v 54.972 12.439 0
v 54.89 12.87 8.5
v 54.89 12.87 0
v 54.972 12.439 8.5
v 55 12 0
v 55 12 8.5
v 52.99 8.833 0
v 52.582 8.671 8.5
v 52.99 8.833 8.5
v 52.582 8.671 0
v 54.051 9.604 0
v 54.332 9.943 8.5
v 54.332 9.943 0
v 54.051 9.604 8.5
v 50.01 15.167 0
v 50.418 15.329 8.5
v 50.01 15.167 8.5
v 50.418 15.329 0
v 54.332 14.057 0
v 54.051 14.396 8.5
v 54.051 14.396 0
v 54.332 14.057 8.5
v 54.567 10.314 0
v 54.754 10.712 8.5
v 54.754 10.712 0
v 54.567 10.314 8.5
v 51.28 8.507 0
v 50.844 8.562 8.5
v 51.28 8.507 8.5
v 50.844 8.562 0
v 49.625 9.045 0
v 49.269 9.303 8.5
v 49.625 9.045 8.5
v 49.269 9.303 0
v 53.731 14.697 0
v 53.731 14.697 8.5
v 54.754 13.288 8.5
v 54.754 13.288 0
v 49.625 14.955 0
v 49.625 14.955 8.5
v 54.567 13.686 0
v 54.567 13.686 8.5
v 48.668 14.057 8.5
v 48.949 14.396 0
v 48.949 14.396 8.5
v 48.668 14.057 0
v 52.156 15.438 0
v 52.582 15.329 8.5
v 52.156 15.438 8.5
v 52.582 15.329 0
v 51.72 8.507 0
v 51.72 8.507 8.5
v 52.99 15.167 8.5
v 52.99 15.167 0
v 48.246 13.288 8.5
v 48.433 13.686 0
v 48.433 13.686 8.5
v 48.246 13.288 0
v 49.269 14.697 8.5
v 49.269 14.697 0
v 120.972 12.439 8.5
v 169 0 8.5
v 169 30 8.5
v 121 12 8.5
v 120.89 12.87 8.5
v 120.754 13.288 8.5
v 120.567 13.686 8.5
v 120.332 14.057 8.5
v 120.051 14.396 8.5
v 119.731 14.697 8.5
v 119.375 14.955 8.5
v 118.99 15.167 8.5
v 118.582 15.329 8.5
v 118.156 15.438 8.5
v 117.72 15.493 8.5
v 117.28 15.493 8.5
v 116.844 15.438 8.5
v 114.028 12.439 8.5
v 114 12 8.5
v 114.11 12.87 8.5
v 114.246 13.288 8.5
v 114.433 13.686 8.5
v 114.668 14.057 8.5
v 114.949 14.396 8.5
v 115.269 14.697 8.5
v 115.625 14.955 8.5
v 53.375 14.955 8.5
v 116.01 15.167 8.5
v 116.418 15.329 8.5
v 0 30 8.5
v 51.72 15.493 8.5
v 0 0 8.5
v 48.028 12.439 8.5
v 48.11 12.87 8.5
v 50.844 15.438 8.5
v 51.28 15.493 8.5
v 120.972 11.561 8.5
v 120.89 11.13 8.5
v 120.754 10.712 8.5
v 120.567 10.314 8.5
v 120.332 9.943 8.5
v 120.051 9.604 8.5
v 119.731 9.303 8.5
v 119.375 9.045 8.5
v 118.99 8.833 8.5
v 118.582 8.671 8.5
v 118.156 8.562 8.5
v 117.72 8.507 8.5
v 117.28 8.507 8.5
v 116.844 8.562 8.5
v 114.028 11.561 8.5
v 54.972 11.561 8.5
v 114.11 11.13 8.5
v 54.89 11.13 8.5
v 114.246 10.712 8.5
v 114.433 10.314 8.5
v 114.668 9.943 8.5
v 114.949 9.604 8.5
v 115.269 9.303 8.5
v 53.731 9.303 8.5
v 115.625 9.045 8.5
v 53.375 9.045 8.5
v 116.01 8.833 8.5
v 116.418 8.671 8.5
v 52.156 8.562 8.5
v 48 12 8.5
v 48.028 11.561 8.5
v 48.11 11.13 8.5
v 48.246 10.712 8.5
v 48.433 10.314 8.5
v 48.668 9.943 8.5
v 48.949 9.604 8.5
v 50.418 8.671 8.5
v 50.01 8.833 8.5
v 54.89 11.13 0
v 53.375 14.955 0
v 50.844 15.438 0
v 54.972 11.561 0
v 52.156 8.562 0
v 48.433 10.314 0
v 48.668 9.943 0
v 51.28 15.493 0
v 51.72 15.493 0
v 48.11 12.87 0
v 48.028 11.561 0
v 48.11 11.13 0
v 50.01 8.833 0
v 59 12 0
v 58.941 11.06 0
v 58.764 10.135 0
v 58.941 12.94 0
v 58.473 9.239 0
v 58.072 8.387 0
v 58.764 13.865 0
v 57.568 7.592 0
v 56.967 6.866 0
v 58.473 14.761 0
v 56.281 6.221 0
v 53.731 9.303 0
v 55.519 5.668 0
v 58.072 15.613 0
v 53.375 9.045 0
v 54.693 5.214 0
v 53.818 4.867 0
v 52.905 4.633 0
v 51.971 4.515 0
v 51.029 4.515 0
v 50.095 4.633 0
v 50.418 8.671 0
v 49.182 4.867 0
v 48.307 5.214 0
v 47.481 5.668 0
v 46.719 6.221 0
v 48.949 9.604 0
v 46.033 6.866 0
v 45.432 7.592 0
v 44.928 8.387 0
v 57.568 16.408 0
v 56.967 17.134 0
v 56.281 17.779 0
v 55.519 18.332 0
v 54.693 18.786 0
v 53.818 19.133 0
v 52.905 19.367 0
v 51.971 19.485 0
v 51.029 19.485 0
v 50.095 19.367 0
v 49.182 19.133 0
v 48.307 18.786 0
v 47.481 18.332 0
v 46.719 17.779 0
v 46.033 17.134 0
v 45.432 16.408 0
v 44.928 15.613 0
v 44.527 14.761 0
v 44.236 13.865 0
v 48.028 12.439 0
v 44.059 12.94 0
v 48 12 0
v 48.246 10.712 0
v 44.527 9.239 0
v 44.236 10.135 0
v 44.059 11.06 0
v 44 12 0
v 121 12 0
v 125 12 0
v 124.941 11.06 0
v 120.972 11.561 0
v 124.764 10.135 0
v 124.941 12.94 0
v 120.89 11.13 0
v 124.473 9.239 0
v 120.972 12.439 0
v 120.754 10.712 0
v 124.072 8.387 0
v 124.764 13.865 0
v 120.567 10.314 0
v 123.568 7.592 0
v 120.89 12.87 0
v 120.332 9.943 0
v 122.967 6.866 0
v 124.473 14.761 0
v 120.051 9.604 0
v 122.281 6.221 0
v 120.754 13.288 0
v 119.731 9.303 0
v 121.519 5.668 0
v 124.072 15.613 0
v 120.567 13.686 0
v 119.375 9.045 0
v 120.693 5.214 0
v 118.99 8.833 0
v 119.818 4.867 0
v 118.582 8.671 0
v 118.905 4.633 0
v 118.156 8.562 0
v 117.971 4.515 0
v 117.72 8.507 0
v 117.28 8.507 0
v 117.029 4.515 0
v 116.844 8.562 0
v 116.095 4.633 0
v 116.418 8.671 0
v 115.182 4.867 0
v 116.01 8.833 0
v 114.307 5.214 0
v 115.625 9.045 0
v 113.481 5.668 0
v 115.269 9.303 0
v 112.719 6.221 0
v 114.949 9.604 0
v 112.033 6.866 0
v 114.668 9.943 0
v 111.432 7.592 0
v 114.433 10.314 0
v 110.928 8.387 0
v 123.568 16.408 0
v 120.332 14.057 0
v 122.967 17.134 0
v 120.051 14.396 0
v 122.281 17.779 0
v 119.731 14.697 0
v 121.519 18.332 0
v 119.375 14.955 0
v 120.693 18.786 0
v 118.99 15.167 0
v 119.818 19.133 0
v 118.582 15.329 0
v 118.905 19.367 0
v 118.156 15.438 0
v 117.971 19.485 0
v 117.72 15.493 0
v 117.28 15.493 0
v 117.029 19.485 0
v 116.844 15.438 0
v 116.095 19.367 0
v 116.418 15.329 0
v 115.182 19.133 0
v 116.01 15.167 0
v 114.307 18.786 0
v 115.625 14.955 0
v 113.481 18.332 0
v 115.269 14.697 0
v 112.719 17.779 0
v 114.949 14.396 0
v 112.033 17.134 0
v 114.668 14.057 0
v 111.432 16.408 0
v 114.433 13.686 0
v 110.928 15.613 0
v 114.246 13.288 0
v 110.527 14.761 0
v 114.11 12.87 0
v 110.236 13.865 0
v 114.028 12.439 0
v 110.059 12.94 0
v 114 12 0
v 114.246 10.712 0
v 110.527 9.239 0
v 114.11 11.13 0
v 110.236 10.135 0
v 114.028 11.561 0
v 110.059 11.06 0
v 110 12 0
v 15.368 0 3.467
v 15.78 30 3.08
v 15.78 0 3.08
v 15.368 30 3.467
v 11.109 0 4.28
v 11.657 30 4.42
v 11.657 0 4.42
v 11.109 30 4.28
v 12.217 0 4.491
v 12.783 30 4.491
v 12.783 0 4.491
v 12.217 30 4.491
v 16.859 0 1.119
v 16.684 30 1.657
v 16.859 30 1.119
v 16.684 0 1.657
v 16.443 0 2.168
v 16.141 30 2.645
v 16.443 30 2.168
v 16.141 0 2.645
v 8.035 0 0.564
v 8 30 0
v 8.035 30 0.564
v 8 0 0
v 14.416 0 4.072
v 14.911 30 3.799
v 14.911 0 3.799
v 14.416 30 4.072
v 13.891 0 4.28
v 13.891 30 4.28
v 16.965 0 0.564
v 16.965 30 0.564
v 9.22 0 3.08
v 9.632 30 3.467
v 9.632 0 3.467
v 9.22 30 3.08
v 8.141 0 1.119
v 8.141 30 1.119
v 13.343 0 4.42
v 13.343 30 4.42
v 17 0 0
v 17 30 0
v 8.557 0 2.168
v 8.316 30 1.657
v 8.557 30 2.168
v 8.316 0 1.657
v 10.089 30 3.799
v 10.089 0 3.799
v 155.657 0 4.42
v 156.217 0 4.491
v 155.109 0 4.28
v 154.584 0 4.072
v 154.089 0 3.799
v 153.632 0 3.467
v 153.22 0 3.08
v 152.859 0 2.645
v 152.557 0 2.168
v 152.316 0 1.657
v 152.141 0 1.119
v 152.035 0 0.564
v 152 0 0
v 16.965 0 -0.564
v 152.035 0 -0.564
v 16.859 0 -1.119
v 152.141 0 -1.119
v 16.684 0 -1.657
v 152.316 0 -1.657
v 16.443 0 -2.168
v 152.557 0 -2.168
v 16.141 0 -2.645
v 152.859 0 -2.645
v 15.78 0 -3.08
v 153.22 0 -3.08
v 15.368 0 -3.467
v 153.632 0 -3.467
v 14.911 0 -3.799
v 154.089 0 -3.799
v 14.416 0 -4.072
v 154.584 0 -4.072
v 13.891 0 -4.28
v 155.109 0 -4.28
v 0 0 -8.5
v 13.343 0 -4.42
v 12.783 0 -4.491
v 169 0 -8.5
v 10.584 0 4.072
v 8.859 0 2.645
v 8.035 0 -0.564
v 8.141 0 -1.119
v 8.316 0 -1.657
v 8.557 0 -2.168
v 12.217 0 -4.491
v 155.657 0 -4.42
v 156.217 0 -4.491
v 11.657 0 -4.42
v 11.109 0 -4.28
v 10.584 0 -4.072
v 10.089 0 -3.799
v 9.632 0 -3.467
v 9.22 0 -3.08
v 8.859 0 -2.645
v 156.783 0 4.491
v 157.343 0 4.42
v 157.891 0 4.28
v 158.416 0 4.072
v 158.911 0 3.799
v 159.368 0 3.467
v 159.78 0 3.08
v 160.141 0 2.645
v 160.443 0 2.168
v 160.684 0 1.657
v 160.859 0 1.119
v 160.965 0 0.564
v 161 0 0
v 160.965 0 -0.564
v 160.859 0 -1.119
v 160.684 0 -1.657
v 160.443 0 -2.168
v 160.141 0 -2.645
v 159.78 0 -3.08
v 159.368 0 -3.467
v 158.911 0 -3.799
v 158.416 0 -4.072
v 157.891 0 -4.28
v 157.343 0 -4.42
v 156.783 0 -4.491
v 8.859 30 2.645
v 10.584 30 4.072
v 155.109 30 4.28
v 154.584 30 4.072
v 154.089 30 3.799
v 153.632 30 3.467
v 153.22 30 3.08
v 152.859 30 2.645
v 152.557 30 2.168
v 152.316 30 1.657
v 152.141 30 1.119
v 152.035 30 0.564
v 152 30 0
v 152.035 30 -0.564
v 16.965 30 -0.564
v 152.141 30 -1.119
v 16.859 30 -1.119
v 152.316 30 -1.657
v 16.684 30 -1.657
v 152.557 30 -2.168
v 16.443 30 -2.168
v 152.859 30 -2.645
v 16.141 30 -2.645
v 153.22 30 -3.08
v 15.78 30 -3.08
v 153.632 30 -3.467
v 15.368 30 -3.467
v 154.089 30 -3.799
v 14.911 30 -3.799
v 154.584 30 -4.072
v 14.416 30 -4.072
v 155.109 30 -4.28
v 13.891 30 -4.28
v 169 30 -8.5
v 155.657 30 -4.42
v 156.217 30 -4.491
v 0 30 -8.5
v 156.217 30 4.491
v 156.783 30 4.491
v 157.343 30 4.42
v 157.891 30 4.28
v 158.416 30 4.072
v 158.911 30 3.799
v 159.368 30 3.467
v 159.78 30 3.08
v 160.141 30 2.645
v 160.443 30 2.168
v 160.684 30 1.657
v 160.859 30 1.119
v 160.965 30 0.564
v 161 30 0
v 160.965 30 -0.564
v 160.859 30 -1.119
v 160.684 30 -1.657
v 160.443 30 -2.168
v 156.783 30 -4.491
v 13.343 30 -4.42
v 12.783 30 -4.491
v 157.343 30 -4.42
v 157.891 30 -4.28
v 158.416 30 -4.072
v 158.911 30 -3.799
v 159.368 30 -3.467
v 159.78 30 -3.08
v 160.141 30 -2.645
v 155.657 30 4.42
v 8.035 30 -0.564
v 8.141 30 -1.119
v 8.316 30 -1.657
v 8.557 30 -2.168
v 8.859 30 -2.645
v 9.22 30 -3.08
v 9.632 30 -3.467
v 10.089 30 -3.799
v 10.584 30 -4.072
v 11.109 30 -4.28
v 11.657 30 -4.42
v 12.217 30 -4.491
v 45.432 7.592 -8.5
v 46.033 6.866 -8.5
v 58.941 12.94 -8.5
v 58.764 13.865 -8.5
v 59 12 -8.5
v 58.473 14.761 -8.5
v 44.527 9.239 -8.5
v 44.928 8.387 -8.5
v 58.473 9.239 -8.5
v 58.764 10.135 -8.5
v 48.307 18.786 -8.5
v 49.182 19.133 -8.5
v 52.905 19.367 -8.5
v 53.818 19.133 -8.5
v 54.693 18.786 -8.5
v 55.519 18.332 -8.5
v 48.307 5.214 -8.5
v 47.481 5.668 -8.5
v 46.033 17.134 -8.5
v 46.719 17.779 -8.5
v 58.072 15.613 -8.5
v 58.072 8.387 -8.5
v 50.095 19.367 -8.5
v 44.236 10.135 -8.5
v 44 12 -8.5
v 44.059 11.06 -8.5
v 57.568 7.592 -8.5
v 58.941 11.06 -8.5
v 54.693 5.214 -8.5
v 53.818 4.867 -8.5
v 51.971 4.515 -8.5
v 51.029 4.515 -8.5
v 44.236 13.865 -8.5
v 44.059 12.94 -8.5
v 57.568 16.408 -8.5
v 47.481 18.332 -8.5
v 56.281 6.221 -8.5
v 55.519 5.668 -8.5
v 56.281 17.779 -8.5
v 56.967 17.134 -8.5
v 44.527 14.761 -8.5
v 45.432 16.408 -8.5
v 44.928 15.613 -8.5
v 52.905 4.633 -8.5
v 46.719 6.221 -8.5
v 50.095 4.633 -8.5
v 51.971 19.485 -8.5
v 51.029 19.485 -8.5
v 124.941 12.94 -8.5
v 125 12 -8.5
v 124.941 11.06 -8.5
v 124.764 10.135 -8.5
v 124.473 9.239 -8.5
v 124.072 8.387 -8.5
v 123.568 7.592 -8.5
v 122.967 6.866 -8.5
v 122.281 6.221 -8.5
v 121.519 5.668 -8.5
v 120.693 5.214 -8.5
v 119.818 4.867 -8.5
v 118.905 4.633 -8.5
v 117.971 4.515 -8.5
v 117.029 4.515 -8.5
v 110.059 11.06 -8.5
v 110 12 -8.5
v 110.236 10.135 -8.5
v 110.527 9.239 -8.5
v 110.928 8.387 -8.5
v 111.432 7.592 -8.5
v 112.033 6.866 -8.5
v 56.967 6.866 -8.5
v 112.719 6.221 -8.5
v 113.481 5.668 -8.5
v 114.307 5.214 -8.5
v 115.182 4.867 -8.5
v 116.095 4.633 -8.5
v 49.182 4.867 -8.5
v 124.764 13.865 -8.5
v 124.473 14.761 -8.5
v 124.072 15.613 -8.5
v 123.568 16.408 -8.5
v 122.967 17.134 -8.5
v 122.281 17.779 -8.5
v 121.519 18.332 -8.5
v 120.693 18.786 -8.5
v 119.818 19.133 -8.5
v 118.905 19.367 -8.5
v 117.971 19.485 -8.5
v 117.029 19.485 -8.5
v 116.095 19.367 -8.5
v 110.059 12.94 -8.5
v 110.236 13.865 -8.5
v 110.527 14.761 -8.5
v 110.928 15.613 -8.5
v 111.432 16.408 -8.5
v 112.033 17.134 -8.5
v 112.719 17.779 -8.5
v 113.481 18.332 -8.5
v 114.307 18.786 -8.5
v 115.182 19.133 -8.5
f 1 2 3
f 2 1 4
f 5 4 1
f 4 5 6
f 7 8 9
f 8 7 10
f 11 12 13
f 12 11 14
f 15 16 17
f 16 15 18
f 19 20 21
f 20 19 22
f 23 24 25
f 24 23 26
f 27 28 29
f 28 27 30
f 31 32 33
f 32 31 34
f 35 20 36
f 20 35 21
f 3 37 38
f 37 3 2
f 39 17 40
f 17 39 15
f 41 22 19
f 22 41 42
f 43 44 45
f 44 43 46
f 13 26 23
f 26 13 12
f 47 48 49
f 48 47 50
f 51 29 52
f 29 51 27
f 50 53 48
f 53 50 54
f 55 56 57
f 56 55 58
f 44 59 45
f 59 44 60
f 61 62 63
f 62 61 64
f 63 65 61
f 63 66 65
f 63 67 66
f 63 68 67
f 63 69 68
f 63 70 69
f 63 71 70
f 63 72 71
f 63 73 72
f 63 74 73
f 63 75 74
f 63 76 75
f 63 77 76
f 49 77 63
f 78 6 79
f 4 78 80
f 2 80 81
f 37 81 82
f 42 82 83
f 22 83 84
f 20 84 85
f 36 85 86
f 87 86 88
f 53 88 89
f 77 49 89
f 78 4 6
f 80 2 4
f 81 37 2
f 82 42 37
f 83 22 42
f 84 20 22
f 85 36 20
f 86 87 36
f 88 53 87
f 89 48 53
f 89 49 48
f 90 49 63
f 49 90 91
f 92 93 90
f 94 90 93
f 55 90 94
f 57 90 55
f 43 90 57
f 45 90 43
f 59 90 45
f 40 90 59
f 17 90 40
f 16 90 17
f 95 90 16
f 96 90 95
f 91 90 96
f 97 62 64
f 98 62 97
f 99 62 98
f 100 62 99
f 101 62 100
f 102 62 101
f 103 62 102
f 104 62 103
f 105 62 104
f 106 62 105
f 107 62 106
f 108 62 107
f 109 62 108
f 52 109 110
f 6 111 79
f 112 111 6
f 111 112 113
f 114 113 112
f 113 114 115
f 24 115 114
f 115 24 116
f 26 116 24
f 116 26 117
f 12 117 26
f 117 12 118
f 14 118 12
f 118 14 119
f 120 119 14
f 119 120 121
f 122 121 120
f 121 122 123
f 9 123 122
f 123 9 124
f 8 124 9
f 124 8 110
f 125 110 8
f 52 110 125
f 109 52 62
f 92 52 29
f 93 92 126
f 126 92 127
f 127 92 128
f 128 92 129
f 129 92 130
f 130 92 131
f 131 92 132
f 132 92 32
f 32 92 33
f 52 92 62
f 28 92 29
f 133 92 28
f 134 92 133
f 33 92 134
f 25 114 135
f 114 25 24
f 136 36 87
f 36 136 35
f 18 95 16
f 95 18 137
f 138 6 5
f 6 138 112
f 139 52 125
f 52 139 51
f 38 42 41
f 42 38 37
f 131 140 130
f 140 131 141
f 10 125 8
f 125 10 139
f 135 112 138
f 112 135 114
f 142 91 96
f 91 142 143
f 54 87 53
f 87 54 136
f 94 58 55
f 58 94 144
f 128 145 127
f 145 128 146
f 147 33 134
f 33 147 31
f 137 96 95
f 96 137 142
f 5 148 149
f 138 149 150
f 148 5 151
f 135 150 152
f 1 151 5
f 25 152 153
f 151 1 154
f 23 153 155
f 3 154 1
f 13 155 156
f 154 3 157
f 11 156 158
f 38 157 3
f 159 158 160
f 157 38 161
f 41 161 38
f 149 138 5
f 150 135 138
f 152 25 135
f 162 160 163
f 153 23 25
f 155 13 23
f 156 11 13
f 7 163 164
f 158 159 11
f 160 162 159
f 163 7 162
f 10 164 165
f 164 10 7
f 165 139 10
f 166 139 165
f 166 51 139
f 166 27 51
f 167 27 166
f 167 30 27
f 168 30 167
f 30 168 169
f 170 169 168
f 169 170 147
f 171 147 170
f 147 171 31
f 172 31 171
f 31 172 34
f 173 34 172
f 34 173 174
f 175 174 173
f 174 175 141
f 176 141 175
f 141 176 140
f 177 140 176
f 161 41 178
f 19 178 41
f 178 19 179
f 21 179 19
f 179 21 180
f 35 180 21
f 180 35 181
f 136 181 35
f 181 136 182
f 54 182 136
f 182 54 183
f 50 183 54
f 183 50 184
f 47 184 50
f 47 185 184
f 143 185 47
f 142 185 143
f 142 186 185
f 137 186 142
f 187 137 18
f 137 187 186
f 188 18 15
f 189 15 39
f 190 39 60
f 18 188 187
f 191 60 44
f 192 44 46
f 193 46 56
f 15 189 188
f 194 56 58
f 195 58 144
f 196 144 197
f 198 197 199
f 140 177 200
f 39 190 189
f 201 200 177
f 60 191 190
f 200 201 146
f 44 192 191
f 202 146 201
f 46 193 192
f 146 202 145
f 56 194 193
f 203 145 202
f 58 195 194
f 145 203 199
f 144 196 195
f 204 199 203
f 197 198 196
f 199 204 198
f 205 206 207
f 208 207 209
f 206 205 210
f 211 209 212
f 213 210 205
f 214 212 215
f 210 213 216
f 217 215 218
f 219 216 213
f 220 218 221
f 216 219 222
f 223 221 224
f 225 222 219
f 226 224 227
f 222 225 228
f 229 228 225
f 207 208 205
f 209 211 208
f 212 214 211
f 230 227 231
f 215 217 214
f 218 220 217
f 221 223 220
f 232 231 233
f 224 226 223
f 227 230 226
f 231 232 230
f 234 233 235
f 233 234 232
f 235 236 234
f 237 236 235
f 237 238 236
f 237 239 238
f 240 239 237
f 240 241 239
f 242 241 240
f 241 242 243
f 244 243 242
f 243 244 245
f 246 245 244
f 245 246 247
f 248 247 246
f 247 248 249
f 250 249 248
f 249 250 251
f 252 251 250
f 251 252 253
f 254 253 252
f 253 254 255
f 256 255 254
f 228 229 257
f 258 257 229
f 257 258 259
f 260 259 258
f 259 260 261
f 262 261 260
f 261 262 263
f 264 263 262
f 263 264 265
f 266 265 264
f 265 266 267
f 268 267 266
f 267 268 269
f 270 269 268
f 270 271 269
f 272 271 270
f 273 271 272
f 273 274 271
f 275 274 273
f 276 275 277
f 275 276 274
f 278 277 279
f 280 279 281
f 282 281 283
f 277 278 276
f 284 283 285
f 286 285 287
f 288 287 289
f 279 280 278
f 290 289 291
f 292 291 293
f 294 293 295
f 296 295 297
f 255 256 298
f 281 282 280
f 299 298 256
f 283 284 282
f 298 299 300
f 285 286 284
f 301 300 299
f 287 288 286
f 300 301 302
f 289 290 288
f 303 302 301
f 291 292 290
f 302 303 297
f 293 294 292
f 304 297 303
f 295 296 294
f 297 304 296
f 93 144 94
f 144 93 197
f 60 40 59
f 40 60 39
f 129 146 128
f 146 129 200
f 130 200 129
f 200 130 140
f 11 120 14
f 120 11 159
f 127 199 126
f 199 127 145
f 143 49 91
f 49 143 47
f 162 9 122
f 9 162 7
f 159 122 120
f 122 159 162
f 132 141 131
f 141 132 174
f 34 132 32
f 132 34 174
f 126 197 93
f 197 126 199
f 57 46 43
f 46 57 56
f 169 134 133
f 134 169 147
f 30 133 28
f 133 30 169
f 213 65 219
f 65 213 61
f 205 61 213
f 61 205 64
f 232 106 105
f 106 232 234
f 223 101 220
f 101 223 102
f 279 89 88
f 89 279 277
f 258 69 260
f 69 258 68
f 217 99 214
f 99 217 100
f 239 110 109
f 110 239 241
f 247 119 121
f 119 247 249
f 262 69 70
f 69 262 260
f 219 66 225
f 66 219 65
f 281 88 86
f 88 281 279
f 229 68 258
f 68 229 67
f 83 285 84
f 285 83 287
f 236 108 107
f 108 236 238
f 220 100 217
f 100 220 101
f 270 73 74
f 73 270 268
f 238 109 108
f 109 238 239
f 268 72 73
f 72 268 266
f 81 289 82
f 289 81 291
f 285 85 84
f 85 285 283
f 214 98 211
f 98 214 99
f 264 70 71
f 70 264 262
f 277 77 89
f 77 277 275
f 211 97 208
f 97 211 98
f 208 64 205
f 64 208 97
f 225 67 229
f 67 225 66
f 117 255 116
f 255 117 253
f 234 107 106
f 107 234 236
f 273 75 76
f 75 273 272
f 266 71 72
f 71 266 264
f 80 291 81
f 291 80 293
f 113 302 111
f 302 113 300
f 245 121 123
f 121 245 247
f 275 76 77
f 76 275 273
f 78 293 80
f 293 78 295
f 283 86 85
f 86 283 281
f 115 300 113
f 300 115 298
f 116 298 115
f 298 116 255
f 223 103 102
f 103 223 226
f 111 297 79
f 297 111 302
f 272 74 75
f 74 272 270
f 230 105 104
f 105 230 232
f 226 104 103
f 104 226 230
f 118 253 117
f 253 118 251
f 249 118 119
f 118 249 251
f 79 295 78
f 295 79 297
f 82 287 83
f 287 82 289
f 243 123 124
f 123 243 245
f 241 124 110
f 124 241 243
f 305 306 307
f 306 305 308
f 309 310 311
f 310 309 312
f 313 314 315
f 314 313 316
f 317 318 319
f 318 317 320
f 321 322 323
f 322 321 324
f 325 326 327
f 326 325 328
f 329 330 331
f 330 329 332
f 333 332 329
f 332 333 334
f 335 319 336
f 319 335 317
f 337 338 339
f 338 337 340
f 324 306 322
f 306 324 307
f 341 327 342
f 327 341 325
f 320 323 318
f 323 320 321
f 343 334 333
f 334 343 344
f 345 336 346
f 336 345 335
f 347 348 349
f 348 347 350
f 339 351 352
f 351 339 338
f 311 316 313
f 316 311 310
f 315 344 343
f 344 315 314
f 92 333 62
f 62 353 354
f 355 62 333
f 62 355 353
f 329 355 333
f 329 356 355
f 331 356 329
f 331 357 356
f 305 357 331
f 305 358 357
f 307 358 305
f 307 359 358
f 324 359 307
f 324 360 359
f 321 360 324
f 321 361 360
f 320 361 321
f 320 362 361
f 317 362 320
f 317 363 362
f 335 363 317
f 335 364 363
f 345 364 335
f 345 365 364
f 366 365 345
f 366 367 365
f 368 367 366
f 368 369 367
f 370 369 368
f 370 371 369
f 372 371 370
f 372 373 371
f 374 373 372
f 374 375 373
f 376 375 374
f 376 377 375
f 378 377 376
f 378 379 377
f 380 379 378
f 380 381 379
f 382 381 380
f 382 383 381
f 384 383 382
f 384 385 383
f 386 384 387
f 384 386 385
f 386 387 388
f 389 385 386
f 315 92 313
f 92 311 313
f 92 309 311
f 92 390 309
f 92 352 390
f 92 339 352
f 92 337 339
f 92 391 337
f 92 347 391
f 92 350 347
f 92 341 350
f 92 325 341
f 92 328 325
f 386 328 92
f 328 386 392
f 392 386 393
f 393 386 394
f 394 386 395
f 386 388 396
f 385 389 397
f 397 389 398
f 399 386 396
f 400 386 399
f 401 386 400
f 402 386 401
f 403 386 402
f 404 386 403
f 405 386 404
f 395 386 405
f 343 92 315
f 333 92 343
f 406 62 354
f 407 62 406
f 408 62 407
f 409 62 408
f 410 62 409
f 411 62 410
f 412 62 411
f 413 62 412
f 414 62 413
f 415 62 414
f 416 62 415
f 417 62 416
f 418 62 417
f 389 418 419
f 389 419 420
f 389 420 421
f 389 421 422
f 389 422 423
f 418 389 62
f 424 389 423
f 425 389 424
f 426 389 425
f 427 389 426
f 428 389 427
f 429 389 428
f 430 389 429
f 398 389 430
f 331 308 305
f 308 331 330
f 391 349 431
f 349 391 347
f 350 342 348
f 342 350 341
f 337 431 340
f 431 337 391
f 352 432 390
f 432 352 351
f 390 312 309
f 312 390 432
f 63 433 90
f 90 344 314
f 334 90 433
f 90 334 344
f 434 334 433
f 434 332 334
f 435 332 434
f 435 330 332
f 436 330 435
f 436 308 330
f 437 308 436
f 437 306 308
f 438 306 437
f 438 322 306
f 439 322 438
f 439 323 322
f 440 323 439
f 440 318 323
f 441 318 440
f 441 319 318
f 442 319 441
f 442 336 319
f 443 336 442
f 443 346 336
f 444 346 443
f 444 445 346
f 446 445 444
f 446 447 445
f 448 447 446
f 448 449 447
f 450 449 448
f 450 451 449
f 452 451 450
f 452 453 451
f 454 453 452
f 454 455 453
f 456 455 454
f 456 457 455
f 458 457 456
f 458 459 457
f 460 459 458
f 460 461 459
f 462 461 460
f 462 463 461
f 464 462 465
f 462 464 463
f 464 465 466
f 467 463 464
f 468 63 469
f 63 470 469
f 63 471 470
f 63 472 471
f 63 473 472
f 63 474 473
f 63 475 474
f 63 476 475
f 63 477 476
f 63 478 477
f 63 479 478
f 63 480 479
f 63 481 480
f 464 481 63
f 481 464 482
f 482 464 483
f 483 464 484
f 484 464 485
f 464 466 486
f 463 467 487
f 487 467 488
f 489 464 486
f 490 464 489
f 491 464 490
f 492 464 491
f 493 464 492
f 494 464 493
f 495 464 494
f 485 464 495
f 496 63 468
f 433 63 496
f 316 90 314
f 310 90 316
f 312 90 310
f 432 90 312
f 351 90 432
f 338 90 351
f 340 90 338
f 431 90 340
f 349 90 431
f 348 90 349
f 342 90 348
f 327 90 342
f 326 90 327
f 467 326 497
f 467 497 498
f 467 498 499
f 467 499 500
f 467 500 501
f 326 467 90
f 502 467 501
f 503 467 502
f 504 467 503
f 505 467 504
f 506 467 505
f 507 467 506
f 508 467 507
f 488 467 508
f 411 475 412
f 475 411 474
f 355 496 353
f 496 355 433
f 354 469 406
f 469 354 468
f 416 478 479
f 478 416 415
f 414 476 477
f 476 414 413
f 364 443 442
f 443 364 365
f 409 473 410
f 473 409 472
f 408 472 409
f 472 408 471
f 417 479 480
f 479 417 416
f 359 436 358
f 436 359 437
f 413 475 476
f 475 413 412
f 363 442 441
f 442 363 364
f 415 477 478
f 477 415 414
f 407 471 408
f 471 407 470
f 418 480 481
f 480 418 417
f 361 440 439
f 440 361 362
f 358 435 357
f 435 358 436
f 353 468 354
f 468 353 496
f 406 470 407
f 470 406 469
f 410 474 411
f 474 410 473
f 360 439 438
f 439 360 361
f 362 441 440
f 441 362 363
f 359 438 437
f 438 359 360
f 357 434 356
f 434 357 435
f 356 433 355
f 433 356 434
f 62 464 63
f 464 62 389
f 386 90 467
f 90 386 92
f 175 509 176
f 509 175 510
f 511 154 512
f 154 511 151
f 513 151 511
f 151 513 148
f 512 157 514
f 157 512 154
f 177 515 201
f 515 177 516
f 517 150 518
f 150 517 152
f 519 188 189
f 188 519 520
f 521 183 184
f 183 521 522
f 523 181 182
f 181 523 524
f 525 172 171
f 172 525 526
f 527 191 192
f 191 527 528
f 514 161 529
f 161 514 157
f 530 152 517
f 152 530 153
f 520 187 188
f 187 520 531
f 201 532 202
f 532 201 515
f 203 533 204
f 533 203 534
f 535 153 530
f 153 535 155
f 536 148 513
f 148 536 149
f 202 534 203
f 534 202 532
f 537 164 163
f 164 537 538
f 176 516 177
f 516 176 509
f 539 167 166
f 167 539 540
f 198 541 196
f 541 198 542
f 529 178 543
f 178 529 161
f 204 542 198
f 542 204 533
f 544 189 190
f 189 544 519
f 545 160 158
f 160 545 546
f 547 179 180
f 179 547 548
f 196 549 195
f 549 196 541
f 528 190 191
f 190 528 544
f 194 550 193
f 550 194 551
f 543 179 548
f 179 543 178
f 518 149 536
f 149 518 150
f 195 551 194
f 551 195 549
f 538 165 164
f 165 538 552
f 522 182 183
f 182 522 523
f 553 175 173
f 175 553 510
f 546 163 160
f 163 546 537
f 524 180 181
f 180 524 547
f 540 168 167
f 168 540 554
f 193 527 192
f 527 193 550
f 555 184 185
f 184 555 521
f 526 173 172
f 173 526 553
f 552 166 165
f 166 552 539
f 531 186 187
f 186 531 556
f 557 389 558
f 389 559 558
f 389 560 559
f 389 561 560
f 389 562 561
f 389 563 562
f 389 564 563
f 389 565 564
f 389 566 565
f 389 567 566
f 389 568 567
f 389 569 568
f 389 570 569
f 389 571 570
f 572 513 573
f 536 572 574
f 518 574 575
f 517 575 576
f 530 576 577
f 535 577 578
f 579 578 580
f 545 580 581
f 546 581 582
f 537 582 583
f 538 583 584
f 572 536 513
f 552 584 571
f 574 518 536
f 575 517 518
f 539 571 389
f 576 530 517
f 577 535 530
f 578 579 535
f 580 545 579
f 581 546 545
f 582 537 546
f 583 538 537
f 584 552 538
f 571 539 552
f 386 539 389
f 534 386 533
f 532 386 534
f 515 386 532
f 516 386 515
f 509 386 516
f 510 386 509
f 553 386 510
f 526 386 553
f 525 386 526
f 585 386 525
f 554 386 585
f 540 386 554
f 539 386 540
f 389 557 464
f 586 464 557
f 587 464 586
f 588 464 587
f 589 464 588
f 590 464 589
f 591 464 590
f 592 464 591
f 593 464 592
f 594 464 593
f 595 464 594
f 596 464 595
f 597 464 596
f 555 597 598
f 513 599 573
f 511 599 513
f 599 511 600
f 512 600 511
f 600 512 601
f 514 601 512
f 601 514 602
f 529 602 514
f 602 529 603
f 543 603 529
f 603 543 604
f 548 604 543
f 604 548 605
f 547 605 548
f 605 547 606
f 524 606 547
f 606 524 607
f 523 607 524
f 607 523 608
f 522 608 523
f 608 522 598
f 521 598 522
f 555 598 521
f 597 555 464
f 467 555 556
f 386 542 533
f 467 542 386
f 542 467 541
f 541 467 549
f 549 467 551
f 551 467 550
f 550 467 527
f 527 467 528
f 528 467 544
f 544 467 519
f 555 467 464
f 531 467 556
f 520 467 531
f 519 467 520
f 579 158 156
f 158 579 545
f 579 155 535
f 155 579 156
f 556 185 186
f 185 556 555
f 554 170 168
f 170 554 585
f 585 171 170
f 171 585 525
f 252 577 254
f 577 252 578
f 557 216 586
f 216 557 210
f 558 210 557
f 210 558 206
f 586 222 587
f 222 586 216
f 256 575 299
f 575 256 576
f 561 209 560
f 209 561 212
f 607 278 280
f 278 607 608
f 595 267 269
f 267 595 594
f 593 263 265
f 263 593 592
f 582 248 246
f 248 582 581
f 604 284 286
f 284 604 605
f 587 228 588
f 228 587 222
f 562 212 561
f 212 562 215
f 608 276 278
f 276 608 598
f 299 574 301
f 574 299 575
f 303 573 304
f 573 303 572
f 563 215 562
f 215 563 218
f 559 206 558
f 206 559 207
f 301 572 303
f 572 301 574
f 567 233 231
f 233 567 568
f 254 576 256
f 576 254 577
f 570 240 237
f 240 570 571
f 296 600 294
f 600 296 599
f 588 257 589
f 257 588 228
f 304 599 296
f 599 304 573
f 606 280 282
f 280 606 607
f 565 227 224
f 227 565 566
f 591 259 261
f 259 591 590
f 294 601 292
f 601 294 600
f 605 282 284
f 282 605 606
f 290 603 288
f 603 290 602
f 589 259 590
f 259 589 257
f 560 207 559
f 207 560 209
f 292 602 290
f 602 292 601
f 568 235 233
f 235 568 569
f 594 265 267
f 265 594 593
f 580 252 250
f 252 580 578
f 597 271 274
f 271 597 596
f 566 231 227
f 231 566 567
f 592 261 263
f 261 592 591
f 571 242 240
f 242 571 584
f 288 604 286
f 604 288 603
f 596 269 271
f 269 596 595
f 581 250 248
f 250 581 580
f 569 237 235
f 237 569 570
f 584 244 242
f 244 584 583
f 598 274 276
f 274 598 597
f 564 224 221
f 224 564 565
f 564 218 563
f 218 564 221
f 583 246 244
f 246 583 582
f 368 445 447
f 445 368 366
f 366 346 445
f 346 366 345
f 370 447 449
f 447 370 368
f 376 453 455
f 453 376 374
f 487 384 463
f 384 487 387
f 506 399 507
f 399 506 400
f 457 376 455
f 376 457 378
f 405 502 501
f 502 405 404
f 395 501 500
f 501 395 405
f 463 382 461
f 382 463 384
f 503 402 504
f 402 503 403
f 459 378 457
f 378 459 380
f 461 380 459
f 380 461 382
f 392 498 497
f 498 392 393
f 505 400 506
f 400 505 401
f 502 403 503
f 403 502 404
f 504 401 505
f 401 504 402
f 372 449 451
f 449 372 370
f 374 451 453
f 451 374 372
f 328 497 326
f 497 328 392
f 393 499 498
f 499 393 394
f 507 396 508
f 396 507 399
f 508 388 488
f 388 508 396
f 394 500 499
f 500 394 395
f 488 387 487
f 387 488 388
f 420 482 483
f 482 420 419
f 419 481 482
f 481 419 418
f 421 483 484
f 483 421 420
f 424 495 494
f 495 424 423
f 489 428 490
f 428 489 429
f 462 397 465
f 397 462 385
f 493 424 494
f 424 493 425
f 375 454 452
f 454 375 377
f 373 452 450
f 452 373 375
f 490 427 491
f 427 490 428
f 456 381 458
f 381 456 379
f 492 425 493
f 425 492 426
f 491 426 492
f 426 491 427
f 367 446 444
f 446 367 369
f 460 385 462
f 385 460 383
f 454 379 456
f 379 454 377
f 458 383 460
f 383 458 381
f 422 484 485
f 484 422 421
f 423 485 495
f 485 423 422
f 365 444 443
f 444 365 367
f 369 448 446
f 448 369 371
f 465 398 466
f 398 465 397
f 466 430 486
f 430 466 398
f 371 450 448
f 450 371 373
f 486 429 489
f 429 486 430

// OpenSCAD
$fn = 50;

lower_rack_width = 153; // End to end
lower_rack_diameter = 9;
bracket_section_extra_height = 4;
bracket_overhang = 8;

tail_light_cutout_hole_diameter = 15;
tail_light_screw_hole_diameter = 7;
tail_light_hole_spacing = 66; // Center to center

holes_y_extra_offset = 3; // Amount to push mounting holes toward rear of bracket
left_hole_x_offset = lower_rack_width / 2 - tail_light_hole_spacing / 2 + bracket_overhang;
right_hole_x_offset = lower_rack_width / 2 + tail_light_hole_spacing / 2 + bracket_overhang;
bracket_depth = 30;
bracket_width = lower_rack_width + 2 * bracket_overhang;
bracket_section_height = lower_rack_diameter / 2 + bracket_section_extra_height;

module draw_tail_light_cutout_holes() {
    translate([left_hole_x_offset, bracket_depth / 2 - holes_y_extra_offset, 0])
        cylinder(h = bracket_section_height, d = tail_light_cutout_hole_diameter);
    translate([right_hole_x_offset, bracket_depth / 2 - holes_y_extra_offset, 0])
        cylinder(h = bracket_section_height, d = tail_light_cutout_hole_diameter);
}

module draw_tail_light_screw_holes() {
    translate([left_hole_x_offset, bracket_depth / 2 - holes_y_extra_offset, 0])
        cylinder(h = bracket_section_height, d = tail_light_screw_hole_diameter);
    translate([right_hole_x_offset, bracket_depth / 2 - holes_y_extra_offset, 0])
        cylinder(h = bracket_section_height, d = tail_light_screw_hole_diameter);
}

module draw_simulated_railings() {
    translate([lower_rack_diameter / 2 + bracket_overhang, 0, 0])
        rotate([-90, 0, 0])
            cylinder(h = bracket_depth, d = lower_rack_diameter);
    
    translate([lower_rack_width - lower_rack_diameter / 2 + bracket_overhang, 0, 0])
        rotate([-90, 0, 0])
            cylinder(h = bracket_depth, d = lower_rack_diameter);
}

module draw_upper_brace() {
    difference() {
        cube([bracket_width, bracket_depth, bracket_section_height]);
        
        draw_tail_light_screw_holes();
        draw_simulated_railings();
    }
}

module draw_lower_brace() {
    translate([0, 0, -bracket_section_height])
        difference() {
            cube([bracket_width, bracket_depth, bracket_section_height]);
            
            draw_tail_light_cutout_holes();
            translate([0, 0, bracket_section_height])
            draw_simulated_railings();
        }
}

draw_upper_brace();
draw_lower_brace();
